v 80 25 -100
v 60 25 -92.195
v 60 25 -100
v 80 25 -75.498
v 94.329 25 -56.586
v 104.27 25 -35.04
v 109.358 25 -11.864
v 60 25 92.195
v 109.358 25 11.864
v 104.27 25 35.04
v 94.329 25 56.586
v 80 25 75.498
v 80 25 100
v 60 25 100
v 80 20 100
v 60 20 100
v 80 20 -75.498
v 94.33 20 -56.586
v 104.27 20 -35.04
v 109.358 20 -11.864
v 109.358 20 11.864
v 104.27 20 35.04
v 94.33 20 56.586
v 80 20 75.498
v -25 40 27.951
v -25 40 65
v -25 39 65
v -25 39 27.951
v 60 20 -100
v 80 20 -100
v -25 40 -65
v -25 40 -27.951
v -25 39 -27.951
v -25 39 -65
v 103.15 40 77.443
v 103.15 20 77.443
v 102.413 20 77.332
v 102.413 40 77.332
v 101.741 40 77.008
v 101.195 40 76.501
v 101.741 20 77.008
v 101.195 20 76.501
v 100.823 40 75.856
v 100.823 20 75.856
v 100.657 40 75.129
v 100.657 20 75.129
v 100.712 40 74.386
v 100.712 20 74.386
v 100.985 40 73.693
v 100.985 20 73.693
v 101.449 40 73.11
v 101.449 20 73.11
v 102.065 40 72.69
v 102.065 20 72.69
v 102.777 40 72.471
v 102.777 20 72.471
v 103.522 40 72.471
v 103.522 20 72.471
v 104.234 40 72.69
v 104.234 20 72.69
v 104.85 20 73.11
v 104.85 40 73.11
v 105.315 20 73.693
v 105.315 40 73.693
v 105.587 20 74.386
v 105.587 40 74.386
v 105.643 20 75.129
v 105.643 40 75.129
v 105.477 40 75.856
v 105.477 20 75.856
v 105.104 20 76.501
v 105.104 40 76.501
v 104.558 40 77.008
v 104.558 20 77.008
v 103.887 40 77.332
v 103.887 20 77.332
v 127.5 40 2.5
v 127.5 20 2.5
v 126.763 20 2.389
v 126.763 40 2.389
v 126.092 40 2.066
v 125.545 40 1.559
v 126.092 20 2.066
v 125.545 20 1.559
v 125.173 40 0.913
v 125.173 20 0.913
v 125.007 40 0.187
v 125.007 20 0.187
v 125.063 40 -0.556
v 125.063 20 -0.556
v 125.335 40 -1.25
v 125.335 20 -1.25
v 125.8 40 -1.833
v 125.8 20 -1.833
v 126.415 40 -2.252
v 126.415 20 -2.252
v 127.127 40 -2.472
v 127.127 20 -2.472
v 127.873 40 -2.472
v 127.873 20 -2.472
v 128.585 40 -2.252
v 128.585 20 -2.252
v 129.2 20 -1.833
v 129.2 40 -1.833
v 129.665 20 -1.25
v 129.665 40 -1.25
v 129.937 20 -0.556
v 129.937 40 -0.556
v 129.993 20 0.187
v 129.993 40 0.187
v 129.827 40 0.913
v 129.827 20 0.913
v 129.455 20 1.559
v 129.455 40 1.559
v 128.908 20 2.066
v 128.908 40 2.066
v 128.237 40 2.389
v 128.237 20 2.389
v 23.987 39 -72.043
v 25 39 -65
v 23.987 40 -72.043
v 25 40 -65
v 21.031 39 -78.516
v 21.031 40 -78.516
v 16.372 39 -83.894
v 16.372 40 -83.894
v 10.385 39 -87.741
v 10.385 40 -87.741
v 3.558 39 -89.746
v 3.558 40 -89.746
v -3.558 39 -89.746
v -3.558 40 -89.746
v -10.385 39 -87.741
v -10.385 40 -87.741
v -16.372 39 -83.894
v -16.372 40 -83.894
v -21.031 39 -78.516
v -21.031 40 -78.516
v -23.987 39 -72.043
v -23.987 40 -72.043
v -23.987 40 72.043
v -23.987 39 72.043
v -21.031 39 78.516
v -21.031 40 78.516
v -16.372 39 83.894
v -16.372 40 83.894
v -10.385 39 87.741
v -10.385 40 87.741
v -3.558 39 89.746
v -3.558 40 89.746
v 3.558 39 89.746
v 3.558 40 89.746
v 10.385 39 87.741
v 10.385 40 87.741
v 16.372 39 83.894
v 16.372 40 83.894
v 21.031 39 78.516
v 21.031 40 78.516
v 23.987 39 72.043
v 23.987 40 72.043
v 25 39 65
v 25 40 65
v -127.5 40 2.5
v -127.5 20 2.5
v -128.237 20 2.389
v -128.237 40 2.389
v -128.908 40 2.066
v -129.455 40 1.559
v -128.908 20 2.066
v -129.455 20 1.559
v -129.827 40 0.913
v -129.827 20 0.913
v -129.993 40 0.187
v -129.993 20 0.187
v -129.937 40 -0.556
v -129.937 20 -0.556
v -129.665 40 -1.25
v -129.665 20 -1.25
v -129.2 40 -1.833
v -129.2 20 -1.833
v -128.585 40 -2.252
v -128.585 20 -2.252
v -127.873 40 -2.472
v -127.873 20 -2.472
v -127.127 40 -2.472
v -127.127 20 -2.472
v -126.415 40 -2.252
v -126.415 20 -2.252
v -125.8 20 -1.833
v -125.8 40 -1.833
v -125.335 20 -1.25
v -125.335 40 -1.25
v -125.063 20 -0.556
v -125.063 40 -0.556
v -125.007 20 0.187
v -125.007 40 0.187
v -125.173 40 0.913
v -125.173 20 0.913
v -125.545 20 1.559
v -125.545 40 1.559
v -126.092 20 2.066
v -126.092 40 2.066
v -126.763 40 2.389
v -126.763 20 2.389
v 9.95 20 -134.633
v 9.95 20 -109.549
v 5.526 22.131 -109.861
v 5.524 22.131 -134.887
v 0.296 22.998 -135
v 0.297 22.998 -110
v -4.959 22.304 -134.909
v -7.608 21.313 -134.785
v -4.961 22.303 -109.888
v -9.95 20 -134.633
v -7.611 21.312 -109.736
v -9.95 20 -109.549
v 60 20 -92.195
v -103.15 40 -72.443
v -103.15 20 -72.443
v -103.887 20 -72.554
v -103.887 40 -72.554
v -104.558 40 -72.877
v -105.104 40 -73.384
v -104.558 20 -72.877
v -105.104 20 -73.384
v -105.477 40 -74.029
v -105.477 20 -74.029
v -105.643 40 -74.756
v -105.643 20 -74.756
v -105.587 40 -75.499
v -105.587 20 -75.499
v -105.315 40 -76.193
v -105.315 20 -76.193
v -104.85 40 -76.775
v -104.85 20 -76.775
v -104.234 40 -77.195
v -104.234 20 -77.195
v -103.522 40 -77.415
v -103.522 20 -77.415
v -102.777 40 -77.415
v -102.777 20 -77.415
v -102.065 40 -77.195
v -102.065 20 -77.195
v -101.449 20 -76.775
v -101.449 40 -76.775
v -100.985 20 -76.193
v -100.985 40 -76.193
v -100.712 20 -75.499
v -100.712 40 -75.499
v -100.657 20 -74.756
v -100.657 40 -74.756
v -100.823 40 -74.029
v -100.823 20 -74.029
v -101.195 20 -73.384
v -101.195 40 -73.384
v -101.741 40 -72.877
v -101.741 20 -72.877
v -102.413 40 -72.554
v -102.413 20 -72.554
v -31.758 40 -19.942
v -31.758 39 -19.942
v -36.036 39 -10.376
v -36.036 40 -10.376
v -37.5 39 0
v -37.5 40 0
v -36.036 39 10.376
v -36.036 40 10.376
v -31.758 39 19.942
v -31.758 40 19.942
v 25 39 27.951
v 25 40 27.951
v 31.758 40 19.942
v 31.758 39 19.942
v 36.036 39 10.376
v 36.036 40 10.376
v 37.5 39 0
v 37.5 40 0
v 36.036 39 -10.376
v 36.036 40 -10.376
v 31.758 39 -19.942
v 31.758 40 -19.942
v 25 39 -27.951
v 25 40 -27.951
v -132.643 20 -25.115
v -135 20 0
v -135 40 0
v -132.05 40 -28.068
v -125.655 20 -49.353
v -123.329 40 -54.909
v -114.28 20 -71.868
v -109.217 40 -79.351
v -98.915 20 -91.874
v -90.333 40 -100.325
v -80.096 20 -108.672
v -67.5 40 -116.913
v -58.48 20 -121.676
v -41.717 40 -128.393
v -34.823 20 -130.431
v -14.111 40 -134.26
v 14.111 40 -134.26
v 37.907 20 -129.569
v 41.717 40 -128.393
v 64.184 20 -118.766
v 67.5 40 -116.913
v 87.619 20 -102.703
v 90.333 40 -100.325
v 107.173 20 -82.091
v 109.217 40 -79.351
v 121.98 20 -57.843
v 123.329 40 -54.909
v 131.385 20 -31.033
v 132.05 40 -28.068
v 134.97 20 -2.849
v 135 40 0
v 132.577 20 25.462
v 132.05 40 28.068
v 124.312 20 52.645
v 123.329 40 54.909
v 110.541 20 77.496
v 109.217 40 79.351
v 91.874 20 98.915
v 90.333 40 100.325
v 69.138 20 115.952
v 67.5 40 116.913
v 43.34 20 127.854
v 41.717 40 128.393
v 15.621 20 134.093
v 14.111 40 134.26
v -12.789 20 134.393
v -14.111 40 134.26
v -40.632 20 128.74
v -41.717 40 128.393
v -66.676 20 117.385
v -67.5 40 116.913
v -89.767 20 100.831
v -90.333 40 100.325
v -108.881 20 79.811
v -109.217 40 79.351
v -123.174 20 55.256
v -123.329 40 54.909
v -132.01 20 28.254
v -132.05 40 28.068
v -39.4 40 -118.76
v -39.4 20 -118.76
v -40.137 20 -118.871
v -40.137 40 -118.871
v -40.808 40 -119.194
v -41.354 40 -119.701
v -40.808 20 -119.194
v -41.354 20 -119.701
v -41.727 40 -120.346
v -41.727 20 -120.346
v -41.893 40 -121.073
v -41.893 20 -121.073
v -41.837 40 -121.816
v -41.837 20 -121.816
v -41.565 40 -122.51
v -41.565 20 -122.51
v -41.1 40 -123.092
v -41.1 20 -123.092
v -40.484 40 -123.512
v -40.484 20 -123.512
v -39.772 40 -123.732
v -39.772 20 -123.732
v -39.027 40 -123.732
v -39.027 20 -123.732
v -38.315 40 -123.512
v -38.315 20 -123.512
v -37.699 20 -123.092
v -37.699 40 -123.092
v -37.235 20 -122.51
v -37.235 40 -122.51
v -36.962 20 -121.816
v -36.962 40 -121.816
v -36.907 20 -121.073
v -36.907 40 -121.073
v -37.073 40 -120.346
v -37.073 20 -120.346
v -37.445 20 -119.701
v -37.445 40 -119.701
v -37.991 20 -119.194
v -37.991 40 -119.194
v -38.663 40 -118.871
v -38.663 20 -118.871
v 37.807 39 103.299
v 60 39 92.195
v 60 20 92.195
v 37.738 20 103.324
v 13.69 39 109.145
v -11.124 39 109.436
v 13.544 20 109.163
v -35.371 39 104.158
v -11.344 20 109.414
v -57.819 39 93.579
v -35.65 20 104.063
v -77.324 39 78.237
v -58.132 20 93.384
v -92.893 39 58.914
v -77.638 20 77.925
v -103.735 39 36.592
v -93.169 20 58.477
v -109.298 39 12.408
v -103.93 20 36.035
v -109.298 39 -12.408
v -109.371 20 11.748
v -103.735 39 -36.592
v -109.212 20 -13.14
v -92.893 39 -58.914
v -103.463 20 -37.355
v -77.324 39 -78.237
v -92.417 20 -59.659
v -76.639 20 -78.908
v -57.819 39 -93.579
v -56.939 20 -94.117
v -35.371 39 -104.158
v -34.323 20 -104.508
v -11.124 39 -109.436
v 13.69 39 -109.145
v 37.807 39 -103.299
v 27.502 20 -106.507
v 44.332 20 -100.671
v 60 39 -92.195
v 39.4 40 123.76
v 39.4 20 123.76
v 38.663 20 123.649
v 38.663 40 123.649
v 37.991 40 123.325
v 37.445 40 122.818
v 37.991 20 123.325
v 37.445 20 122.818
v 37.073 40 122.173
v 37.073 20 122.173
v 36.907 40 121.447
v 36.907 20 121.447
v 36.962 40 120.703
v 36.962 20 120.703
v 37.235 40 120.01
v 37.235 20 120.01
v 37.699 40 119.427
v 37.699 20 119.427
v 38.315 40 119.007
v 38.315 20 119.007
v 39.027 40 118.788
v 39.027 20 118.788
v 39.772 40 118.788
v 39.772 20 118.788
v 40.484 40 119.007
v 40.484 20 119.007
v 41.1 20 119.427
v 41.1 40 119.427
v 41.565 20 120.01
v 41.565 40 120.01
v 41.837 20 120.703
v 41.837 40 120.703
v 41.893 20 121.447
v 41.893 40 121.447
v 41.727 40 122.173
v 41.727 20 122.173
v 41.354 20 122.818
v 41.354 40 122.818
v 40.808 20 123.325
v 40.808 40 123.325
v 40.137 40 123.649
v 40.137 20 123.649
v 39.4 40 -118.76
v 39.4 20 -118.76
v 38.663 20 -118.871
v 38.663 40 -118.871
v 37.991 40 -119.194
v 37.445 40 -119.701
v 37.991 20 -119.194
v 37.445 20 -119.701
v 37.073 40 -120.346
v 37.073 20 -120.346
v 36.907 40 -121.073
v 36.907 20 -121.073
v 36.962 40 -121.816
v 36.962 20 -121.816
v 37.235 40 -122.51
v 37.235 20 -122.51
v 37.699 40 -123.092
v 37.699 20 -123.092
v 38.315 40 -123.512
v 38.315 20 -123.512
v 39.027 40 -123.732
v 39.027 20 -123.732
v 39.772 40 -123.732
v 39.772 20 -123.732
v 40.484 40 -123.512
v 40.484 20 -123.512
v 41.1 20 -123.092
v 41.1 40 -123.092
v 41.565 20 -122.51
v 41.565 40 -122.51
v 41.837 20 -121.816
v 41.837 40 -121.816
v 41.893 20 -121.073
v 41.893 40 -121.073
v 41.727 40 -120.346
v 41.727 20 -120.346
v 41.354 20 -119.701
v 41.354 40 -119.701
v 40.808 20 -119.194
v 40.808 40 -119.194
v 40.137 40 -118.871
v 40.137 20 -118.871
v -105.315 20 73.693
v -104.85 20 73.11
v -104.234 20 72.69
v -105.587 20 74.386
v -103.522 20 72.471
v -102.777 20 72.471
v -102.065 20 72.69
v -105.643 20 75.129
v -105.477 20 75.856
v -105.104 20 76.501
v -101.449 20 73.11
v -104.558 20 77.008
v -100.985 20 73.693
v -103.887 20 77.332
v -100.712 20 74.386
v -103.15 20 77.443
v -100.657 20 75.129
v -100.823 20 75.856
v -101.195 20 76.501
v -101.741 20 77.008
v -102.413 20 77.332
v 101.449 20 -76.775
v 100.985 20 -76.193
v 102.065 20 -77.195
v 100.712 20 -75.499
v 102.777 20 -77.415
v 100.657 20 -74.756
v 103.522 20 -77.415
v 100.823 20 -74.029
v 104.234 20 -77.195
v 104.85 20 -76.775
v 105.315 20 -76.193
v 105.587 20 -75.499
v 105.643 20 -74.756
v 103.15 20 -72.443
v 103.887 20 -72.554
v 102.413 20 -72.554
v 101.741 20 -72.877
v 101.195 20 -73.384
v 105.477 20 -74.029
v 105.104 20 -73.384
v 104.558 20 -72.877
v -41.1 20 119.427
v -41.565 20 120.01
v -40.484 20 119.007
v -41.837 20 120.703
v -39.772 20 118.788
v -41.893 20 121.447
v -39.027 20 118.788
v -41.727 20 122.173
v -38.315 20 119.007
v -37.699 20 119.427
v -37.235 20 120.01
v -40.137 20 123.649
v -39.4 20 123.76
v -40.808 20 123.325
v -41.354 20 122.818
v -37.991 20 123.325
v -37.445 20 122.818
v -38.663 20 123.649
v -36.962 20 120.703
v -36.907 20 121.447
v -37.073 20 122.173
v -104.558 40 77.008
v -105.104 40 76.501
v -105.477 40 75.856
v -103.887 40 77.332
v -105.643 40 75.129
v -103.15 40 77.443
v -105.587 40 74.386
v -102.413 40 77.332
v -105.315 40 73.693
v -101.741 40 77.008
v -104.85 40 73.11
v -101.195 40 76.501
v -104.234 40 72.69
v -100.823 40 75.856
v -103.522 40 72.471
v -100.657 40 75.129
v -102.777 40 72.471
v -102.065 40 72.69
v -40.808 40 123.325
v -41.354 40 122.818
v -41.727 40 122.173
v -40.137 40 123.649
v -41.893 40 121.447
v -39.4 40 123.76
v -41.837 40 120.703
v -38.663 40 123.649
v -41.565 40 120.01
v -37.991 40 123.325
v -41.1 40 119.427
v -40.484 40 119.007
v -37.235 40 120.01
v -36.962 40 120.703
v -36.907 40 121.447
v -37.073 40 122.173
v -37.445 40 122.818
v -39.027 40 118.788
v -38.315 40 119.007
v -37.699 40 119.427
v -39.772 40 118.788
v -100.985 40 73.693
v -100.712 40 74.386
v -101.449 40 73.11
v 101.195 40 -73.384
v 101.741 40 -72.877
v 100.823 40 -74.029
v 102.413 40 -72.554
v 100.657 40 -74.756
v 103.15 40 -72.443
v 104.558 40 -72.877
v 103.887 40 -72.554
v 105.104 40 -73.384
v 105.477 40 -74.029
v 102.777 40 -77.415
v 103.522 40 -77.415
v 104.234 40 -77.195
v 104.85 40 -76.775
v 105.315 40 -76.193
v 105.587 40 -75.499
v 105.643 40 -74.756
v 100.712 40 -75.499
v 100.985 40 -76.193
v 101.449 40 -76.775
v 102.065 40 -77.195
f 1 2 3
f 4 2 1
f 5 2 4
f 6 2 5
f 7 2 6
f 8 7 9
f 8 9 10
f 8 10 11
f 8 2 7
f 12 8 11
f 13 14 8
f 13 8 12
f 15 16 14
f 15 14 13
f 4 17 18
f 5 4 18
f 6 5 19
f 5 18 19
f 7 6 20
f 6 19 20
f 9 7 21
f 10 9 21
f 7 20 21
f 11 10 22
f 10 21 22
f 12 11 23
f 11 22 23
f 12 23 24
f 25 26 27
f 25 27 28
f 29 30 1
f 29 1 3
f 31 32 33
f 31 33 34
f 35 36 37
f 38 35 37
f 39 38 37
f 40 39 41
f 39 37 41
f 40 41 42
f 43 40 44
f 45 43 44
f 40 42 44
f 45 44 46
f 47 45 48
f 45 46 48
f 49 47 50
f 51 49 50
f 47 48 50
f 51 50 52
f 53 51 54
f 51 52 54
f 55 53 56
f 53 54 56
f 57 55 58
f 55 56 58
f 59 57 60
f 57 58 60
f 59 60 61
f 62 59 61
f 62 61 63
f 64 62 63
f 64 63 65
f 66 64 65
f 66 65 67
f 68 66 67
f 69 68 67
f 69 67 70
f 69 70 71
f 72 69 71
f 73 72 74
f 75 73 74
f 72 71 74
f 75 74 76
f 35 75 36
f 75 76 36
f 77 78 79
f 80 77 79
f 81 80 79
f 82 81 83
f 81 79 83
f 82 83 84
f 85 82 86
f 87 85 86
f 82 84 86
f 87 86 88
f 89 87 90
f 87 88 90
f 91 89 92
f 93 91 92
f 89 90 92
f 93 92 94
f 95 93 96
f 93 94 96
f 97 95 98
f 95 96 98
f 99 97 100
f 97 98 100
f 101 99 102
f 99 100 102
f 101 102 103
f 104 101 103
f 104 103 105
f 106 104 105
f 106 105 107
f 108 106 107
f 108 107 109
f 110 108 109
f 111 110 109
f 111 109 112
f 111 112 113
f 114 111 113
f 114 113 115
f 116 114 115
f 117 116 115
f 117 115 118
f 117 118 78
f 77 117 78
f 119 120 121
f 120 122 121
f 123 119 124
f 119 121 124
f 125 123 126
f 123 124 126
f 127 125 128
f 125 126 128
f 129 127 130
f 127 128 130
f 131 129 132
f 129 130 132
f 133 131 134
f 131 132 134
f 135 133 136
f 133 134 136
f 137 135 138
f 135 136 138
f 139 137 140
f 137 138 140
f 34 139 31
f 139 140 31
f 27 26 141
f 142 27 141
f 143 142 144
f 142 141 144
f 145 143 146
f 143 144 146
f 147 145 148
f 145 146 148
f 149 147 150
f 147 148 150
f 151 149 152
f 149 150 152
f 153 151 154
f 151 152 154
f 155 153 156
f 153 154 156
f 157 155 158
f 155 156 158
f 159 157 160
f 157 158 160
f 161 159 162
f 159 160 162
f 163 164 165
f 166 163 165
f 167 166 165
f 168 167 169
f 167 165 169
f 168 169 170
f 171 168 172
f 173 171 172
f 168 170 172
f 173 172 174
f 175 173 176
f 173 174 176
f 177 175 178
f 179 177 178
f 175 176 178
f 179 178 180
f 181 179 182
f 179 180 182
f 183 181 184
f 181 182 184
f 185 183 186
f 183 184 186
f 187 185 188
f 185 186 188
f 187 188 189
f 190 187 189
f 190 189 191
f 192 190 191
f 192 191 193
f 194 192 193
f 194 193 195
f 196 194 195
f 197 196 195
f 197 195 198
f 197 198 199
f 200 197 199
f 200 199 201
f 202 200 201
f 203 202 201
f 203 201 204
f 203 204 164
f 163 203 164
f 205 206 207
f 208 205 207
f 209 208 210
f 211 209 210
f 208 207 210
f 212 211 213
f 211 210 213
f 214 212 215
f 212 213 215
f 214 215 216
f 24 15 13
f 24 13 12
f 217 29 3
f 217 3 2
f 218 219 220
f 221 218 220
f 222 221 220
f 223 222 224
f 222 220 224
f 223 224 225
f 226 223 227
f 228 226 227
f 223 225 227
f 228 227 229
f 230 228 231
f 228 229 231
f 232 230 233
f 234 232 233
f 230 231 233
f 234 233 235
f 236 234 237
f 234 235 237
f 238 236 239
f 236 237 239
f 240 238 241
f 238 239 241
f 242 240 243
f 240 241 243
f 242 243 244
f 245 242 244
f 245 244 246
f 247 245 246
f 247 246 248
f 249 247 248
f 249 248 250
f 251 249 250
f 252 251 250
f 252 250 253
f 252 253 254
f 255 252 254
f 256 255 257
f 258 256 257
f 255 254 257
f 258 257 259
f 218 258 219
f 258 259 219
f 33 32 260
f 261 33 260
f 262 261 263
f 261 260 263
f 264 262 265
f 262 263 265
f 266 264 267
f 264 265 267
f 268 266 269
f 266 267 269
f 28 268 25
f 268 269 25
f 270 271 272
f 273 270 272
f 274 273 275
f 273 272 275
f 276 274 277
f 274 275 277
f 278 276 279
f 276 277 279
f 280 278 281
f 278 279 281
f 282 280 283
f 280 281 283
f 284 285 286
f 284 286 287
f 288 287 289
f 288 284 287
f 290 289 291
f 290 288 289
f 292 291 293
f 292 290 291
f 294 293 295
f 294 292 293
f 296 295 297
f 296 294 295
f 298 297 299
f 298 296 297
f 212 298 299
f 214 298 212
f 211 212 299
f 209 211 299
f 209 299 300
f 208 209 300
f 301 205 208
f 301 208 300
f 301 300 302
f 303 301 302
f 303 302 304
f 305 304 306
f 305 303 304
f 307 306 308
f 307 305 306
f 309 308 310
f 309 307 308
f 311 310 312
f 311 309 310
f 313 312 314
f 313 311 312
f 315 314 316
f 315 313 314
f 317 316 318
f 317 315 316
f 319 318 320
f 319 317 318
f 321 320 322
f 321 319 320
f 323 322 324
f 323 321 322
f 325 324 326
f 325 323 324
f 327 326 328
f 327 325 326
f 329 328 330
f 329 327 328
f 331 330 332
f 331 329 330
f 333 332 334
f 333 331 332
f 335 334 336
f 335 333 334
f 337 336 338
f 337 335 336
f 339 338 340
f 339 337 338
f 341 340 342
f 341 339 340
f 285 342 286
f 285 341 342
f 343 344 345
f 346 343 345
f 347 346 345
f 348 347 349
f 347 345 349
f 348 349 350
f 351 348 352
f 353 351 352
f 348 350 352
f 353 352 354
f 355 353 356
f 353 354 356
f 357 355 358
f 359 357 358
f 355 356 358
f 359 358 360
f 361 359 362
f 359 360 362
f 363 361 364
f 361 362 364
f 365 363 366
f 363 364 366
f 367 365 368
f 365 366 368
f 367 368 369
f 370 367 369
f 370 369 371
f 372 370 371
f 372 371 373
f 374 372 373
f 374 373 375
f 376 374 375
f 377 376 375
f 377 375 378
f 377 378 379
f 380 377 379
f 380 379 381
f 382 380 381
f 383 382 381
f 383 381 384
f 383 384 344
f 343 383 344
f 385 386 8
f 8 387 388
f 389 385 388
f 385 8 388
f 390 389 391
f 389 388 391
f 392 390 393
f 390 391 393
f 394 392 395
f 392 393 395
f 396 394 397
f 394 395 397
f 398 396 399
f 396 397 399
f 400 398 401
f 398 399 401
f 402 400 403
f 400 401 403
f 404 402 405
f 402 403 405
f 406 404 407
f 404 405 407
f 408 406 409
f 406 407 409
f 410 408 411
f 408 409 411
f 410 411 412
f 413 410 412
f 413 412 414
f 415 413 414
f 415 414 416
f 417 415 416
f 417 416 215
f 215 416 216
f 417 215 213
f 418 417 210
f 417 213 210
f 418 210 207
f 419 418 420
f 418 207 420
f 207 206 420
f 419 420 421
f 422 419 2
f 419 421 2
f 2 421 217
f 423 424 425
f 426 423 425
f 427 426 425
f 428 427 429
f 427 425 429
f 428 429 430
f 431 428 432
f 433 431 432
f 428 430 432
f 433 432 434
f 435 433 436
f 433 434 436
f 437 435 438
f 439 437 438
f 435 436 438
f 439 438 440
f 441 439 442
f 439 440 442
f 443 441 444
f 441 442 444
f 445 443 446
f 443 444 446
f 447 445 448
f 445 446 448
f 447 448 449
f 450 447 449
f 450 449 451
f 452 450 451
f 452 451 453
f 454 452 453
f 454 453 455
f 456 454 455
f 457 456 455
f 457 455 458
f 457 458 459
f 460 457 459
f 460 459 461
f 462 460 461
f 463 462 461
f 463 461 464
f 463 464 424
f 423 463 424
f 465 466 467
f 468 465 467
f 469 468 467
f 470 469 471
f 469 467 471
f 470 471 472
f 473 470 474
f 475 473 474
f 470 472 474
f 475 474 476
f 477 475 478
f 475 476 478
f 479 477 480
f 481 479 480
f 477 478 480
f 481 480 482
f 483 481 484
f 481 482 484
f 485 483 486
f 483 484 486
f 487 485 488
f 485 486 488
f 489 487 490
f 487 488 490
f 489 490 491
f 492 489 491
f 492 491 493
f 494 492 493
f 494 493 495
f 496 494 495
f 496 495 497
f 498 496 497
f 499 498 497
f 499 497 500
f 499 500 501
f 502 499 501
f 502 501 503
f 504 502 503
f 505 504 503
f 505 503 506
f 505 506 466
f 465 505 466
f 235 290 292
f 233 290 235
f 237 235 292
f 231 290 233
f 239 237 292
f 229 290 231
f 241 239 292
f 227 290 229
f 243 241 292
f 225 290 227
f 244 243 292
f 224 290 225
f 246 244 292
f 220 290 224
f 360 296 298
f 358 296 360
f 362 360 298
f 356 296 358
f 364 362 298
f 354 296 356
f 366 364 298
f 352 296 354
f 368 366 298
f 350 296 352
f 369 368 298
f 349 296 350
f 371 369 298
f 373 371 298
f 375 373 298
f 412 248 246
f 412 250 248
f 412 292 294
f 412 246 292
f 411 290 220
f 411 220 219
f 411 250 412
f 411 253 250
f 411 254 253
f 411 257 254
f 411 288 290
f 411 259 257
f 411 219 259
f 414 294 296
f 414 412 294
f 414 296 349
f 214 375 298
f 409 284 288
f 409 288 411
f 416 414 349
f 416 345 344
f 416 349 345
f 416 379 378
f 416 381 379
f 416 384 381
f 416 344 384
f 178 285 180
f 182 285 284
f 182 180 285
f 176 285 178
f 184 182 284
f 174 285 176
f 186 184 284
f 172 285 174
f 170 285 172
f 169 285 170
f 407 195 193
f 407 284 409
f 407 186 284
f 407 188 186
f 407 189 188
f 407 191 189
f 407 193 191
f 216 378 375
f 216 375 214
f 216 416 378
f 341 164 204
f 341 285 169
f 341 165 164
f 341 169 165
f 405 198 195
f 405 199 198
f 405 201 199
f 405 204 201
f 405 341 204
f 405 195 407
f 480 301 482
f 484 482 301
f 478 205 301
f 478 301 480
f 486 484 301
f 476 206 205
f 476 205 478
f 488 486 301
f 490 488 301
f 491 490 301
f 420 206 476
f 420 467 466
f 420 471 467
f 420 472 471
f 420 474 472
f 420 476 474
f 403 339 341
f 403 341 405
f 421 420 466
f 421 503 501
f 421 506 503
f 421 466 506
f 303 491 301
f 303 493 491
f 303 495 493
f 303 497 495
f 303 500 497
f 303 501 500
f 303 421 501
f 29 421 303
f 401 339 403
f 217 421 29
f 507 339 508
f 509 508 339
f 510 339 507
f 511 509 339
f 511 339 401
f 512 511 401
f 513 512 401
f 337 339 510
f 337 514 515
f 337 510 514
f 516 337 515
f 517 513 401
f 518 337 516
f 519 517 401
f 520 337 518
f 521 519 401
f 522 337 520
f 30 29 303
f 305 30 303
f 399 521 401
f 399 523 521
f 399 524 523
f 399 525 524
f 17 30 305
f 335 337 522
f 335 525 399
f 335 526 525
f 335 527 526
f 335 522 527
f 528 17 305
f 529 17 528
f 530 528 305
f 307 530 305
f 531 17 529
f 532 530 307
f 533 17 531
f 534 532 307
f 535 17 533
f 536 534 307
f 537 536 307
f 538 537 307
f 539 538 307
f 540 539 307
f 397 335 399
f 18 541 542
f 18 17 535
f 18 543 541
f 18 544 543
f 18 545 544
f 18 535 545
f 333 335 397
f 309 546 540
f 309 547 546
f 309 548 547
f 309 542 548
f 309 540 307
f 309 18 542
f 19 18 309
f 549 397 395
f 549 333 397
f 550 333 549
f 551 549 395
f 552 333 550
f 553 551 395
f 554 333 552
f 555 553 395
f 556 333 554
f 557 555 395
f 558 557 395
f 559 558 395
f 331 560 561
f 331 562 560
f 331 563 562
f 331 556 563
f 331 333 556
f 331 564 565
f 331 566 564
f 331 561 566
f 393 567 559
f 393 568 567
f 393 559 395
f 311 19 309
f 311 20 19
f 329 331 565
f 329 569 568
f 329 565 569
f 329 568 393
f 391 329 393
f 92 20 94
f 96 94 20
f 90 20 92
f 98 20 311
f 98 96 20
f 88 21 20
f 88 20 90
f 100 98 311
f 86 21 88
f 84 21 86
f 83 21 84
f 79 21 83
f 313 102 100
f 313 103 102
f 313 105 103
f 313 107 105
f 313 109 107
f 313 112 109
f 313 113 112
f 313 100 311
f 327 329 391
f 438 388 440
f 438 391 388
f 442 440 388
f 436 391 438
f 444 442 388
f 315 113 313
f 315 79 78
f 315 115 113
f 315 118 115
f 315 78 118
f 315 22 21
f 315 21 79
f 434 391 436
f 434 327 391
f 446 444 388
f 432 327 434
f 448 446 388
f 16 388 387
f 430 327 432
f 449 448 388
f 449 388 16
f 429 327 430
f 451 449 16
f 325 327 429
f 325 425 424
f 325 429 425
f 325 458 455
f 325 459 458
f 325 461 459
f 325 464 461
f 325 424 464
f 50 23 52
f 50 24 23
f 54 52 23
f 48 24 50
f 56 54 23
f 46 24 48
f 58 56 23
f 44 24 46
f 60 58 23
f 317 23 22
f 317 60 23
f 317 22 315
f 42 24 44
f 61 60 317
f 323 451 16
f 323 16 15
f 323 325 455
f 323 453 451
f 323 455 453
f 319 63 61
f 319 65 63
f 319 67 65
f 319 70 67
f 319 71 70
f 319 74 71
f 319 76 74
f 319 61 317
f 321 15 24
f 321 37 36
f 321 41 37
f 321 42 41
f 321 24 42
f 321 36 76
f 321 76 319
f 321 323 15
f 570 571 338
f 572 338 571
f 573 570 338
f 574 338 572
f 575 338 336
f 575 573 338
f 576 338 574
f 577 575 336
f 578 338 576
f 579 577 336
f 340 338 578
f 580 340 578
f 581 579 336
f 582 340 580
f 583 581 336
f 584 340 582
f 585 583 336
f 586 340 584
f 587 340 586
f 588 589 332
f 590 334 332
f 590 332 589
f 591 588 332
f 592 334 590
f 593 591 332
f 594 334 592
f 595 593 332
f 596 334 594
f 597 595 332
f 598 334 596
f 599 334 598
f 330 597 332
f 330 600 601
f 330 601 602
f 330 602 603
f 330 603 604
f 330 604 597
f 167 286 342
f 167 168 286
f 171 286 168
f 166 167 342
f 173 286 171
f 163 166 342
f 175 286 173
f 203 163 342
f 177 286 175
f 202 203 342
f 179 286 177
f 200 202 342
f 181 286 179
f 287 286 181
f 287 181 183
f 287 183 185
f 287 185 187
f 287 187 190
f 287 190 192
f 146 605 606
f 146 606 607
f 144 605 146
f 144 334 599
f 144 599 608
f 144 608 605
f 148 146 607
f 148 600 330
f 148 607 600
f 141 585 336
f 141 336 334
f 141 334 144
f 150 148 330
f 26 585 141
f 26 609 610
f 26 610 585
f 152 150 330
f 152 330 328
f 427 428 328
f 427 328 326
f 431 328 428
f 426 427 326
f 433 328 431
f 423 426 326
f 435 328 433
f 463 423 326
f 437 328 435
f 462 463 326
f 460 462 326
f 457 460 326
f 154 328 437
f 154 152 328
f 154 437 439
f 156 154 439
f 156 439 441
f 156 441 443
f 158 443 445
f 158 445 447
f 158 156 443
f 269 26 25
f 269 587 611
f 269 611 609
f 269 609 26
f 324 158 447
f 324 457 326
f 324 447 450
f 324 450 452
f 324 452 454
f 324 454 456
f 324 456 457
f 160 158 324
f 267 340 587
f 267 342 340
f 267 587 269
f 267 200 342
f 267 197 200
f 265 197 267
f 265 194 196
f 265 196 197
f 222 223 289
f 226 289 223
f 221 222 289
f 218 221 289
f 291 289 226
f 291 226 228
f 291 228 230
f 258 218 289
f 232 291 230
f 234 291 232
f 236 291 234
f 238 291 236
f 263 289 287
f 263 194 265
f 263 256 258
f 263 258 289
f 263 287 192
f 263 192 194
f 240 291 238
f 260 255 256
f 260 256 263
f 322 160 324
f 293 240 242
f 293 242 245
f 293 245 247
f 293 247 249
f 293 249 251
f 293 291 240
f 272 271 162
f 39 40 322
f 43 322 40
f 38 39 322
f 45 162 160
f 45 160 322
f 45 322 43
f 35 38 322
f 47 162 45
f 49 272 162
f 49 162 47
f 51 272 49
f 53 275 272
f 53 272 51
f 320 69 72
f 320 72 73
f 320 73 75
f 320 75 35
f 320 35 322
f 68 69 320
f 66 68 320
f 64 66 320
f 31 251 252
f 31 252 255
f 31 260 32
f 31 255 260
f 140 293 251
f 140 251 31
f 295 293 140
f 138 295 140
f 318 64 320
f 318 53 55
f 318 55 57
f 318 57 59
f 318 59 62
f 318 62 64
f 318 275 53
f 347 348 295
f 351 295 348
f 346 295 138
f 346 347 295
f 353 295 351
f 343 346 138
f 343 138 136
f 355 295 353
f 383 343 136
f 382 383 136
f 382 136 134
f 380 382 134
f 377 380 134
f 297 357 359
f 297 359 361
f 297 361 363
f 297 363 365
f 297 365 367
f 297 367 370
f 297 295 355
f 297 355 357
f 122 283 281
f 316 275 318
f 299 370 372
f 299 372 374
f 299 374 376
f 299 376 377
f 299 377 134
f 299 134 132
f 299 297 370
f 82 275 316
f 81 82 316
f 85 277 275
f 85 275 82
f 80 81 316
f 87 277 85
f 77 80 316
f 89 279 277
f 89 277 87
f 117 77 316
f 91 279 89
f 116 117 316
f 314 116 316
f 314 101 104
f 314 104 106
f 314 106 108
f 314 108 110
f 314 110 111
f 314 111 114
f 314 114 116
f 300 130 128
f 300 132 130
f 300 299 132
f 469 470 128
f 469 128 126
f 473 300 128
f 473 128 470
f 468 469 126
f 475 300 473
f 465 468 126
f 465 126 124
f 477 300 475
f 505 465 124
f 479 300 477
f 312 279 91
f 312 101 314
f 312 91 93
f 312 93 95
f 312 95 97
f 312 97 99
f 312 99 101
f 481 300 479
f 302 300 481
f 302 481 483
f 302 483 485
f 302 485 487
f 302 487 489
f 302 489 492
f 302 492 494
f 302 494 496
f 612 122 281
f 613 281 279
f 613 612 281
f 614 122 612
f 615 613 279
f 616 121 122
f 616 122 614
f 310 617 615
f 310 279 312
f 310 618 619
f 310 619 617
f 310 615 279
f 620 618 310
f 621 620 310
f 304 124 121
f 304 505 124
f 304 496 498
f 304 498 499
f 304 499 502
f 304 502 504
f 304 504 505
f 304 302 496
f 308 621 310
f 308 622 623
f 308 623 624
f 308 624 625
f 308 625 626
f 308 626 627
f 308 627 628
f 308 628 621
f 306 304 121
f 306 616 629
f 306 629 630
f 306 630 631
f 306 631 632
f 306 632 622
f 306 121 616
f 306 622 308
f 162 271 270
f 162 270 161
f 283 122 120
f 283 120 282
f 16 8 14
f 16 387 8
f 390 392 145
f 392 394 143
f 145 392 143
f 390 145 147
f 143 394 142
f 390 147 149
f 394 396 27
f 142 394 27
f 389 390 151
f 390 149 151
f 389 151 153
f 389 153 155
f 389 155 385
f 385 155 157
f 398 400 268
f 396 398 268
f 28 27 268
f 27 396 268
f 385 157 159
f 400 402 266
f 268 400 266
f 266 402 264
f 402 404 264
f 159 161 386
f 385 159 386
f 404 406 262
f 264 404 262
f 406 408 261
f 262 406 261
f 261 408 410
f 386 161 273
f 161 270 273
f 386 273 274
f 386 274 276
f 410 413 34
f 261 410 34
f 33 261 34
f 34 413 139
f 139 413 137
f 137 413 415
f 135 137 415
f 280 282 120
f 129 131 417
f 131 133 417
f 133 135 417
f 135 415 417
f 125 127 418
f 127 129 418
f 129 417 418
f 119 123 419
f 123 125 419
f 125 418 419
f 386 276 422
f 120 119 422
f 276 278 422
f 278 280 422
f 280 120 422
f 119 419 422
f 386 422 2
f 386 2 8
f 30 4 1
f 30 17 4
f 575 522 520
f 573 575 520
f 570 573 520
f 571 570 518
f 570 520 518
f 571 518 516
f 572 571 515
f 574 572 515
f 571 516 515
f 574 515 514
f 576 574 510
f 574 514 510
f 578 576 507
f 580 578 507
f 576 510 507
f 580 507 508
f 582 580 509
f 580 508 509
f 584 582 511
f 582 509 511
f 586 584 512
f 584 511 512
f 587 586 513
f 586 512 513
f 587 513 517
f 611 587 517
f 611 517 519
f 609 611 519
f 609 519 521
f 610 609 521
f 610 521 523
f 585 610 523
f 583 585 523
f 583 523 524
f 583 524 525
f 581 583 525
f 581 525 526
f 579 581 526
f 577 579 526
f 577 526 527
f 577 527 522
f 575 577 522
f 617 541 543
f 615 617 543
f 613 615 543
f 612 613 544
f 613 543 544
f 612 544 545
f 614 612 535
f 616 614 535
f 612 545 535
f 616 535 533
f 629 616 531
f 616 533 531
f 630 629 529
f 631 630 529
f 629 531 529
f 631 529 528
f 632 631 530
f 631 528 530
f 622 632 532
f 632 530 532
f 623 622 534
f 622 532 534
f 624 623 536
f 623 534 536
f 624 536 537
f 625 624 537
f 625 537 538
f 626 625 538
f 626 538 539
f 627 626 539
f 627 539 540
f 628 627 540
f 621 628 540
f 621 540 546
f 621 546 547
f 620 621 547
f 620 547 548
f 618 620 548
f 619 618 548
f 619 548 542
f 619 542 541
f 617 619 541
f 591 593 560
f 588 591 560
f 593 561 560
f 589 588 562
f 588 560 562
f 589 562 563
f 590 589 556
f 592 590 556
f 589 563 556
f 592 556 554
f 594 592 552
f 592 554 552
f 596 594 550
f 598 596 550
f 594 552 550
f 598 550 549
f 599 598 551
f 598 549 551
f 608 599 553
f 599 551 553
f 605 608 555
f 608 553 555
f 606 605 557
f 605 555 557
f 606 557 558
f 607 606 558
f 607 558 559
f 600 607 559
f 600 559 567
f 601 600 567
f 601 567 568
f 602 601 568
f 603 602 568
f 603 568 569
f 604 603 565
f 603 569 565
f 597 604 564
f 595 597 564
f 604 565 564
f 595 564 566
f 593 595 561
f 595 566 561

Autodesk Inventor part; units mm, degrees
ref_plane "YZ Plane" through (0, 0, 0) normal (1, 0, 0) x (0, 1, 0)
ref_plane "XZ Plane" through (0, 0, 0) normal (0, 1, 0) x (-1, 0, 0)
ref_plane "XY Plane" through (0, 0, 0) normal (0, 0, 1) x (1, 0, 0)
sketch "Sketch1" plane through (0, 0, 0) normal (0, 1, 0) x (-1, 0, 0)
  circle A0 centre (0, 0) radius 135
  circle A1 centre (0, 0) radius 110
  dimension "d0" = 270
  dimension "d1" = 220
extrude "Extrusion1" add sketch "Sketch1" along normal blind 55
sketch "Sketch2" plane through (0, 0, 0) normal (0, 0, 1) x (1, 0, 0)
  circle A0 centre (0, 5) radius 18
  line L0 (135, 0) -> (-135, 0) projected
  point P0 (0, 0)
  dimension "d4" = 36
  dimension "d5" = 5
extrude "Extrusion2" cut sketch "Sketch2" against normal through all
sketch "Sketch3" plane through (0, 0, 0) normal (0, -1, 0) x (1, 0, 0)
  circle A0 centre (0, 0) radius 140
extrude "Extrusion3" cut sketch "Sketch3" against normal blind 20
sketch "Sketch4" plane through (0, 20, 0) normal (0, -1, 0) x (1, 0, 0)
  line L0 (0, 0) -> (70, 0)
  line L1 (80, -100) -> (60, -100)
  line L2 (60, -100) -> (60, 100)
  line L3 (60, 100) -> (80, 100)
  line L4 (80, 100) -> (80, -100)
  line L5 (80, -100) -> (60, 100) construction
  line L6 (60, -100) -> (80, 100) construction
  dimension "d10" = 70
  dimension "d11" = 20
  dimension "d12" = 200
extrude "Extrusion4" cut sketch "Sketch4" against normal through all
sketch "Sketch5" plane through (0, 55, 0) normal (0, 1, 0) x (1, 0, 0)
  circle A0 centre (0, 0) radius 127.5
  circle A1 centre (127.5, 0) radius 2
  circle A2 centre (103.1497, 74.9426) radius 2
  circle A3 centre (39.3997, 121.2597) radius 2
  circle A4 centre (-39.3997, 121.2597) radius 2
  circle A5 centre (-103.1497, 74.9426) radius 2
  circle A6 centre (-127.5, 0) radius 2
  circle A7 centre (-103.1497, -74.9426) radius 2
  circle A8 centre (-39.3997, -121.2597) radius 2
  circle A9 centre (39.3997, -121.2597) radius 2
  circle A10 centre (103.1497, -74.9426) radius 2
  dimension "d15" = 255
  dimension "d16" = 4
  dimension "d19" = 360
hole "Hole1" at (127.5, 55, 0) at (103.1497, 55, 74.9426) at (39.3997, 55, 121.2597) at (-39.3997, 55, 121.2597) at (-103.1497, 55, 74.9426) at (-127.5, 55, 0) at (-103.1497, 55, -74.9426) at (-39.3997, 55, -121.2597) at (39.3997, 55, -121.2597) at (103.1497, 55, -74.9426) direction (0, -1, 0) diameter 5 end through all
sketch "Sketch6" plane through (0, 55, 0) normal (0, 1, 0) x (1, 0, 0)
  circle A0 centre (0, 0) radius 140
extrude "Extrusion5" cut sketch "Sketch6" against normal blind 15
sketch "Sketch7" plane through (0, 40, 0) normal (0, 1, 0) x (1, 0, 0)
  circle A0 centre (0, 0) radius 140
  line L0 (80, -100) -> (80, -75.4983) projected
  line L1 (80, -100) -> (80, -75.4983)
  line L2 (60, -100) -> (80, -100) projected
  line L3 (80, -100) -> (60, -100)
  line L4 (60, -100) -> (60, -92.1954)
  line L5 (60, 100) -> (60, 92.1954) projected
  line L6 (60, 92.1954) -> (60, 100)
  line L7 (60, 100) -> (80, 100)
  line L8 (80, 100) -> (80, 75.4983)
  arc A1 (80, -75.4983) -> (80, 75.4983) centre (0, 0) ccw
  arc A2 (60, 92.1954) -> (60, -92.1954) centre (0, 0) ccw
  arc A3 (-25, -65) -> (25, -65) centre (0, -65) ccw
  arc A4 (25, 65) -> (-25, 65) centre (0, 65) ccw
  arc A5 (25, -27.9508) -> (25, 27.9508) centre (0, 0) ccw
  arc A6 (-25, 27.9508) -> (-25, -27.9508) centre (0, 0) ccw
  line L9 (25, 65) -> (25, 27.9508)
  line L10 (25, -27.9508) -> (25, -65)
  line L11 (-25, -65) -> (-25, -27.9508)
  line L12 (-25, 27.9508) -> (-25, 65)
extrude "Extrusion6" add sketch "Sketch7" against normal blind 1 contours L2 L4 A2 L5 L7 L8 A1 L0
sketch "Sketch8" plane through (0, 39, 0) normal (0, -1, 0) x (1, 0, 0)
  line L0 (80, -75.4983) -> (80, -100) projected
  line L1 (80, -100) -> (60, -100)
  line L2 (60, -100) -> (60, 100)
  line L3 (60, 100) -> (80, 100)
  line L4 (80, 100) -> (80, 75.4983)
  line L5 (80, -75.4983) -> (80, -100)
  arc A0 (80, -75.4983) -> (80, 75.4983) centre (0, 0) ccw
  arc A1 (60, 92.1954) -> (60, -92.1954) centre (0, 0) ccw
extrude "Extrusion7" add sketch "Sketch8" along normal blind 14 contours L0 L1 L2 L3 L4 A0
properties part number "Cylinder Spacer Top"
